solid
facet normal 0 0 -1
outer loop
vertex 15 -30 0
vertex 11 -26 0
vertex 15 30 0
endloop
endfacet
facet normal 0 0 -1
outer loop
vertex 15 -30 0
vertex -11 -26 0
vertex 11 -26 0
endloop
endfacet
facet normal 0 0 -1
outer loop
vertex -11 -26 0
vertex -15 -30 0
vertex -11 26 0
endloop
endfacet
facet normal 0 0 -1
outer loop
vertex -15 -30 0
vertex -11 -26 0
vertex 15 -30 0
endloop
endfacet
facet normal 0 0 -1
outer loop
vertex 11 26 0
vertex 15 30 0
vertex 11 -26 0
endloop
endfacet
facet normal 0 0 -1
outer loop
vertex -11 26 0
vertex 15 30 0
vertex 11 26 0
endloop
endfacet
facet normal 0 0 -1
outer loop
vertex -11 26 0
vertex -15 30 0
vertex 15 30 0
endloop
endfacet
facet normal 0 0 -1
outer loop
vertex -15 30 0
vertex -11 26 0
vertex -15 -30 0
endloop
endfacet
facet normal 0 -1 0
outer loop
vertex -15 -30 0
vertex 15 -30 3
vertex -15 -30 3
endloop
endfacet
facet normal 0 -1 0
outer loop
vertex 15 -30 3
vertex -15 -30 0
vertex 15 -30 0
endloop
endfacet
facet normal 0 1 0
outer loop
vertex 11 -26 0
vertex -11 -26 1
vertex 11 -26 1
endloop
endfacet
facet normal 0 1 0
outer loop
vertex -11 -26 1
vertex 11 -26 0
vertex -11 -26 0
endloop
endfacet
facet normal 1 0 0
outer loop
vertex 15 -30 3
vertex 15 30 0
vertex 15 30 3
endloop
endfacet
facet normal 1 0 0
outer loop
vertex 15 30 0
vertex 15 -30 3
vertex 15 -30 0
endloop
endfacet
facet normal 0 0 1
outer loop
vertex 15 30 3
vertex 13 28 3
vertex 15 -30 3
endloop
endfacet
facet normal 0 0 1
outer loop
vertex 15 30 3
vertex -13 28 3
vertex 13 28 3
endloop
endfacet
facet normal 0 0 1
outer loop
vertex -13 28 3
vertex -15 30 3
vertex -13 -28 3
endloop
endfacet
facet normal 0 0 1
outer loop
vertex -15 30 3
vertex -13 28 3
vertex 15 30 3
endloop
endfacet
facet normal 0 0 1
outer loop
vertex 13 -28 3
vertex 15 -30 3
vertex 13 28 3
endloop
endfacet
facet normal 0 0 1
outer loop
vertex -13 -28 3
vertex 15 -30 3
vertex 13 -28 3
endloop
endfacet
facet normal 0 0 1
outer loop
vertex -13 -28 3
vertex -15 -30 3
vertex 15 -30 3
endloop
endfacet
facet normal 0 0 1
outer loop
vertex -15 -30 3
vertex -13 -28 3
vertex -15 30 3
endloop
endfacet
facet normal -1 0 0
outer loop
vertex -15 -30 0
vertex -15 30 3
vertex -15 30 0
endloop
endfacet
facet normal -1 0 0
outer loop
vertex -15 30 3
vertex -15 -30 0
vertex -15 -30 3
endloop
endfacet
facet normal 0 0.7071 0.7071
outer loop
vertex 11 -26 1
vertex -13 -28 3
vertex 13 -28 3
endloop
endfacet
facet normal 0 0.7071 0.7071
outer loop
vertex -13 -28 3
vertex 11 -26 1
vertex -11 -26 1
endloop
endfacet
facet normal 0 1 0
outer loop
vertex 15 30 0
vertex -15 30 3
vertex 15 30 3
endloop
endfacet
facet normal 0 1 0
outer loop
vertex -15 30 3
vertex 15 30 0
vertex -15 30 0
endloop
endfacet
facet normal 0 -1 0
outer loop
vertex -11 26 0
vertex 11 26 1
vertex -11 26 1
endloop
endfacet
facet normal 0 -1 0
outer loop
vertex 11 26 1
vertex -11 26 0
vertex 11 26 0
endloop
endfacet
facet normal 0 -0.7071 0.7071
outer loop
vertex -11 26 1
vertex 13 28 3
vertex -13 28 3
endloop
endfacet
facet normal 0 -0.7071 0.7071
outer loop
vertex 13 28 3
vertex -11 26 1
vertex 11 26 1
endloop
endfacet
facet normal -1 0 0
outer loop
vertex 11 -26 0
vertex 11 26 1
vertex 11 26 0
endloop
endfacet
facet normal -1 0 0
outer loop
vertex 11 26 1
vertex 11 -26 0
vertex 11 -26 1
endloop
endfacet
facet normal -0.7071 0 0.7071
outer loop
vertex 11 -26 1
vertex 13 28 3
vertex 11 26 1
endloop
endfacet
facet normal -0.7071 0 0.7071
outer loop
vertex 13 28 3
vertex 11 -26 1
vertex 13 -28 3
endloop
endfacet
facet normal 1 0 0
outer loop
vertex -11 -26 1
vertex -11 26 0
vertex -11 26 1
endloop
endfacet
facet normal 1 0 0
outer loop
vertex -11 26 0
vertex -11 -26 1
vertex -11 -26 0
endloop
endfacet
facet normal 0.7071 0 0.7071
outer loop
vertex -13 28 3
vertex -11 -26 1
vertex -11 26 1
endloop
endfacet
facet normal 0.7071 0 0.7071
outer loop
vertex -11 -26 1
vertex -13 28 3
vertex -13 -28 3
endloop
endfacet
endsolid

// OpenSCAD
module triangle(o_len, a_len, depth, center=false)
{
    centroid = center ? [-a_len/3, -o_len/3, -depth/2] : [0, 0, 0];
    rotate([0, 90, 0])translate(centroid) linear_extrude(height=depth)
    {
        polygon(points=[[0,0],[a_len,0],[0,o_len]], paths=[[0,1,2]]);
    }
}

module lidsupportline(width, height, thickness, depth)
{
    centroid = [-depth/2, 0, 0];
    translate(centroid) rotate([90, 0, 0]) rotate([0, 90, 0]) linear_extrude(height=depth)
    {
        polygon(points=[[0,0],[width,0],[width, 1],[thickness, height + 1], [0, thickness + 1]]);
    }
}

module lidsupport(width, height, thickness, x, y)
{

    translate([0, -y/2, 0])rotate([0, 0, 0])
        lidsupportline(width, height, thickness, x);
    translate([0, y/2, 0])rotate([0, 0, 180])
        lidsupportline(width, height, thickness, x);

    translate([x/2, 0, 0])rotate([0, 0, 90])
        lidsupportline(width, height, thickness, y);

    translate([-x/2, 0, 0])rotate([0, 0, -90])
        lidsupportline(width, height, thickness, y);
}
lidsupport(4, 2, 2, 30, 60);
//trianglebox(2, 2, 50);
